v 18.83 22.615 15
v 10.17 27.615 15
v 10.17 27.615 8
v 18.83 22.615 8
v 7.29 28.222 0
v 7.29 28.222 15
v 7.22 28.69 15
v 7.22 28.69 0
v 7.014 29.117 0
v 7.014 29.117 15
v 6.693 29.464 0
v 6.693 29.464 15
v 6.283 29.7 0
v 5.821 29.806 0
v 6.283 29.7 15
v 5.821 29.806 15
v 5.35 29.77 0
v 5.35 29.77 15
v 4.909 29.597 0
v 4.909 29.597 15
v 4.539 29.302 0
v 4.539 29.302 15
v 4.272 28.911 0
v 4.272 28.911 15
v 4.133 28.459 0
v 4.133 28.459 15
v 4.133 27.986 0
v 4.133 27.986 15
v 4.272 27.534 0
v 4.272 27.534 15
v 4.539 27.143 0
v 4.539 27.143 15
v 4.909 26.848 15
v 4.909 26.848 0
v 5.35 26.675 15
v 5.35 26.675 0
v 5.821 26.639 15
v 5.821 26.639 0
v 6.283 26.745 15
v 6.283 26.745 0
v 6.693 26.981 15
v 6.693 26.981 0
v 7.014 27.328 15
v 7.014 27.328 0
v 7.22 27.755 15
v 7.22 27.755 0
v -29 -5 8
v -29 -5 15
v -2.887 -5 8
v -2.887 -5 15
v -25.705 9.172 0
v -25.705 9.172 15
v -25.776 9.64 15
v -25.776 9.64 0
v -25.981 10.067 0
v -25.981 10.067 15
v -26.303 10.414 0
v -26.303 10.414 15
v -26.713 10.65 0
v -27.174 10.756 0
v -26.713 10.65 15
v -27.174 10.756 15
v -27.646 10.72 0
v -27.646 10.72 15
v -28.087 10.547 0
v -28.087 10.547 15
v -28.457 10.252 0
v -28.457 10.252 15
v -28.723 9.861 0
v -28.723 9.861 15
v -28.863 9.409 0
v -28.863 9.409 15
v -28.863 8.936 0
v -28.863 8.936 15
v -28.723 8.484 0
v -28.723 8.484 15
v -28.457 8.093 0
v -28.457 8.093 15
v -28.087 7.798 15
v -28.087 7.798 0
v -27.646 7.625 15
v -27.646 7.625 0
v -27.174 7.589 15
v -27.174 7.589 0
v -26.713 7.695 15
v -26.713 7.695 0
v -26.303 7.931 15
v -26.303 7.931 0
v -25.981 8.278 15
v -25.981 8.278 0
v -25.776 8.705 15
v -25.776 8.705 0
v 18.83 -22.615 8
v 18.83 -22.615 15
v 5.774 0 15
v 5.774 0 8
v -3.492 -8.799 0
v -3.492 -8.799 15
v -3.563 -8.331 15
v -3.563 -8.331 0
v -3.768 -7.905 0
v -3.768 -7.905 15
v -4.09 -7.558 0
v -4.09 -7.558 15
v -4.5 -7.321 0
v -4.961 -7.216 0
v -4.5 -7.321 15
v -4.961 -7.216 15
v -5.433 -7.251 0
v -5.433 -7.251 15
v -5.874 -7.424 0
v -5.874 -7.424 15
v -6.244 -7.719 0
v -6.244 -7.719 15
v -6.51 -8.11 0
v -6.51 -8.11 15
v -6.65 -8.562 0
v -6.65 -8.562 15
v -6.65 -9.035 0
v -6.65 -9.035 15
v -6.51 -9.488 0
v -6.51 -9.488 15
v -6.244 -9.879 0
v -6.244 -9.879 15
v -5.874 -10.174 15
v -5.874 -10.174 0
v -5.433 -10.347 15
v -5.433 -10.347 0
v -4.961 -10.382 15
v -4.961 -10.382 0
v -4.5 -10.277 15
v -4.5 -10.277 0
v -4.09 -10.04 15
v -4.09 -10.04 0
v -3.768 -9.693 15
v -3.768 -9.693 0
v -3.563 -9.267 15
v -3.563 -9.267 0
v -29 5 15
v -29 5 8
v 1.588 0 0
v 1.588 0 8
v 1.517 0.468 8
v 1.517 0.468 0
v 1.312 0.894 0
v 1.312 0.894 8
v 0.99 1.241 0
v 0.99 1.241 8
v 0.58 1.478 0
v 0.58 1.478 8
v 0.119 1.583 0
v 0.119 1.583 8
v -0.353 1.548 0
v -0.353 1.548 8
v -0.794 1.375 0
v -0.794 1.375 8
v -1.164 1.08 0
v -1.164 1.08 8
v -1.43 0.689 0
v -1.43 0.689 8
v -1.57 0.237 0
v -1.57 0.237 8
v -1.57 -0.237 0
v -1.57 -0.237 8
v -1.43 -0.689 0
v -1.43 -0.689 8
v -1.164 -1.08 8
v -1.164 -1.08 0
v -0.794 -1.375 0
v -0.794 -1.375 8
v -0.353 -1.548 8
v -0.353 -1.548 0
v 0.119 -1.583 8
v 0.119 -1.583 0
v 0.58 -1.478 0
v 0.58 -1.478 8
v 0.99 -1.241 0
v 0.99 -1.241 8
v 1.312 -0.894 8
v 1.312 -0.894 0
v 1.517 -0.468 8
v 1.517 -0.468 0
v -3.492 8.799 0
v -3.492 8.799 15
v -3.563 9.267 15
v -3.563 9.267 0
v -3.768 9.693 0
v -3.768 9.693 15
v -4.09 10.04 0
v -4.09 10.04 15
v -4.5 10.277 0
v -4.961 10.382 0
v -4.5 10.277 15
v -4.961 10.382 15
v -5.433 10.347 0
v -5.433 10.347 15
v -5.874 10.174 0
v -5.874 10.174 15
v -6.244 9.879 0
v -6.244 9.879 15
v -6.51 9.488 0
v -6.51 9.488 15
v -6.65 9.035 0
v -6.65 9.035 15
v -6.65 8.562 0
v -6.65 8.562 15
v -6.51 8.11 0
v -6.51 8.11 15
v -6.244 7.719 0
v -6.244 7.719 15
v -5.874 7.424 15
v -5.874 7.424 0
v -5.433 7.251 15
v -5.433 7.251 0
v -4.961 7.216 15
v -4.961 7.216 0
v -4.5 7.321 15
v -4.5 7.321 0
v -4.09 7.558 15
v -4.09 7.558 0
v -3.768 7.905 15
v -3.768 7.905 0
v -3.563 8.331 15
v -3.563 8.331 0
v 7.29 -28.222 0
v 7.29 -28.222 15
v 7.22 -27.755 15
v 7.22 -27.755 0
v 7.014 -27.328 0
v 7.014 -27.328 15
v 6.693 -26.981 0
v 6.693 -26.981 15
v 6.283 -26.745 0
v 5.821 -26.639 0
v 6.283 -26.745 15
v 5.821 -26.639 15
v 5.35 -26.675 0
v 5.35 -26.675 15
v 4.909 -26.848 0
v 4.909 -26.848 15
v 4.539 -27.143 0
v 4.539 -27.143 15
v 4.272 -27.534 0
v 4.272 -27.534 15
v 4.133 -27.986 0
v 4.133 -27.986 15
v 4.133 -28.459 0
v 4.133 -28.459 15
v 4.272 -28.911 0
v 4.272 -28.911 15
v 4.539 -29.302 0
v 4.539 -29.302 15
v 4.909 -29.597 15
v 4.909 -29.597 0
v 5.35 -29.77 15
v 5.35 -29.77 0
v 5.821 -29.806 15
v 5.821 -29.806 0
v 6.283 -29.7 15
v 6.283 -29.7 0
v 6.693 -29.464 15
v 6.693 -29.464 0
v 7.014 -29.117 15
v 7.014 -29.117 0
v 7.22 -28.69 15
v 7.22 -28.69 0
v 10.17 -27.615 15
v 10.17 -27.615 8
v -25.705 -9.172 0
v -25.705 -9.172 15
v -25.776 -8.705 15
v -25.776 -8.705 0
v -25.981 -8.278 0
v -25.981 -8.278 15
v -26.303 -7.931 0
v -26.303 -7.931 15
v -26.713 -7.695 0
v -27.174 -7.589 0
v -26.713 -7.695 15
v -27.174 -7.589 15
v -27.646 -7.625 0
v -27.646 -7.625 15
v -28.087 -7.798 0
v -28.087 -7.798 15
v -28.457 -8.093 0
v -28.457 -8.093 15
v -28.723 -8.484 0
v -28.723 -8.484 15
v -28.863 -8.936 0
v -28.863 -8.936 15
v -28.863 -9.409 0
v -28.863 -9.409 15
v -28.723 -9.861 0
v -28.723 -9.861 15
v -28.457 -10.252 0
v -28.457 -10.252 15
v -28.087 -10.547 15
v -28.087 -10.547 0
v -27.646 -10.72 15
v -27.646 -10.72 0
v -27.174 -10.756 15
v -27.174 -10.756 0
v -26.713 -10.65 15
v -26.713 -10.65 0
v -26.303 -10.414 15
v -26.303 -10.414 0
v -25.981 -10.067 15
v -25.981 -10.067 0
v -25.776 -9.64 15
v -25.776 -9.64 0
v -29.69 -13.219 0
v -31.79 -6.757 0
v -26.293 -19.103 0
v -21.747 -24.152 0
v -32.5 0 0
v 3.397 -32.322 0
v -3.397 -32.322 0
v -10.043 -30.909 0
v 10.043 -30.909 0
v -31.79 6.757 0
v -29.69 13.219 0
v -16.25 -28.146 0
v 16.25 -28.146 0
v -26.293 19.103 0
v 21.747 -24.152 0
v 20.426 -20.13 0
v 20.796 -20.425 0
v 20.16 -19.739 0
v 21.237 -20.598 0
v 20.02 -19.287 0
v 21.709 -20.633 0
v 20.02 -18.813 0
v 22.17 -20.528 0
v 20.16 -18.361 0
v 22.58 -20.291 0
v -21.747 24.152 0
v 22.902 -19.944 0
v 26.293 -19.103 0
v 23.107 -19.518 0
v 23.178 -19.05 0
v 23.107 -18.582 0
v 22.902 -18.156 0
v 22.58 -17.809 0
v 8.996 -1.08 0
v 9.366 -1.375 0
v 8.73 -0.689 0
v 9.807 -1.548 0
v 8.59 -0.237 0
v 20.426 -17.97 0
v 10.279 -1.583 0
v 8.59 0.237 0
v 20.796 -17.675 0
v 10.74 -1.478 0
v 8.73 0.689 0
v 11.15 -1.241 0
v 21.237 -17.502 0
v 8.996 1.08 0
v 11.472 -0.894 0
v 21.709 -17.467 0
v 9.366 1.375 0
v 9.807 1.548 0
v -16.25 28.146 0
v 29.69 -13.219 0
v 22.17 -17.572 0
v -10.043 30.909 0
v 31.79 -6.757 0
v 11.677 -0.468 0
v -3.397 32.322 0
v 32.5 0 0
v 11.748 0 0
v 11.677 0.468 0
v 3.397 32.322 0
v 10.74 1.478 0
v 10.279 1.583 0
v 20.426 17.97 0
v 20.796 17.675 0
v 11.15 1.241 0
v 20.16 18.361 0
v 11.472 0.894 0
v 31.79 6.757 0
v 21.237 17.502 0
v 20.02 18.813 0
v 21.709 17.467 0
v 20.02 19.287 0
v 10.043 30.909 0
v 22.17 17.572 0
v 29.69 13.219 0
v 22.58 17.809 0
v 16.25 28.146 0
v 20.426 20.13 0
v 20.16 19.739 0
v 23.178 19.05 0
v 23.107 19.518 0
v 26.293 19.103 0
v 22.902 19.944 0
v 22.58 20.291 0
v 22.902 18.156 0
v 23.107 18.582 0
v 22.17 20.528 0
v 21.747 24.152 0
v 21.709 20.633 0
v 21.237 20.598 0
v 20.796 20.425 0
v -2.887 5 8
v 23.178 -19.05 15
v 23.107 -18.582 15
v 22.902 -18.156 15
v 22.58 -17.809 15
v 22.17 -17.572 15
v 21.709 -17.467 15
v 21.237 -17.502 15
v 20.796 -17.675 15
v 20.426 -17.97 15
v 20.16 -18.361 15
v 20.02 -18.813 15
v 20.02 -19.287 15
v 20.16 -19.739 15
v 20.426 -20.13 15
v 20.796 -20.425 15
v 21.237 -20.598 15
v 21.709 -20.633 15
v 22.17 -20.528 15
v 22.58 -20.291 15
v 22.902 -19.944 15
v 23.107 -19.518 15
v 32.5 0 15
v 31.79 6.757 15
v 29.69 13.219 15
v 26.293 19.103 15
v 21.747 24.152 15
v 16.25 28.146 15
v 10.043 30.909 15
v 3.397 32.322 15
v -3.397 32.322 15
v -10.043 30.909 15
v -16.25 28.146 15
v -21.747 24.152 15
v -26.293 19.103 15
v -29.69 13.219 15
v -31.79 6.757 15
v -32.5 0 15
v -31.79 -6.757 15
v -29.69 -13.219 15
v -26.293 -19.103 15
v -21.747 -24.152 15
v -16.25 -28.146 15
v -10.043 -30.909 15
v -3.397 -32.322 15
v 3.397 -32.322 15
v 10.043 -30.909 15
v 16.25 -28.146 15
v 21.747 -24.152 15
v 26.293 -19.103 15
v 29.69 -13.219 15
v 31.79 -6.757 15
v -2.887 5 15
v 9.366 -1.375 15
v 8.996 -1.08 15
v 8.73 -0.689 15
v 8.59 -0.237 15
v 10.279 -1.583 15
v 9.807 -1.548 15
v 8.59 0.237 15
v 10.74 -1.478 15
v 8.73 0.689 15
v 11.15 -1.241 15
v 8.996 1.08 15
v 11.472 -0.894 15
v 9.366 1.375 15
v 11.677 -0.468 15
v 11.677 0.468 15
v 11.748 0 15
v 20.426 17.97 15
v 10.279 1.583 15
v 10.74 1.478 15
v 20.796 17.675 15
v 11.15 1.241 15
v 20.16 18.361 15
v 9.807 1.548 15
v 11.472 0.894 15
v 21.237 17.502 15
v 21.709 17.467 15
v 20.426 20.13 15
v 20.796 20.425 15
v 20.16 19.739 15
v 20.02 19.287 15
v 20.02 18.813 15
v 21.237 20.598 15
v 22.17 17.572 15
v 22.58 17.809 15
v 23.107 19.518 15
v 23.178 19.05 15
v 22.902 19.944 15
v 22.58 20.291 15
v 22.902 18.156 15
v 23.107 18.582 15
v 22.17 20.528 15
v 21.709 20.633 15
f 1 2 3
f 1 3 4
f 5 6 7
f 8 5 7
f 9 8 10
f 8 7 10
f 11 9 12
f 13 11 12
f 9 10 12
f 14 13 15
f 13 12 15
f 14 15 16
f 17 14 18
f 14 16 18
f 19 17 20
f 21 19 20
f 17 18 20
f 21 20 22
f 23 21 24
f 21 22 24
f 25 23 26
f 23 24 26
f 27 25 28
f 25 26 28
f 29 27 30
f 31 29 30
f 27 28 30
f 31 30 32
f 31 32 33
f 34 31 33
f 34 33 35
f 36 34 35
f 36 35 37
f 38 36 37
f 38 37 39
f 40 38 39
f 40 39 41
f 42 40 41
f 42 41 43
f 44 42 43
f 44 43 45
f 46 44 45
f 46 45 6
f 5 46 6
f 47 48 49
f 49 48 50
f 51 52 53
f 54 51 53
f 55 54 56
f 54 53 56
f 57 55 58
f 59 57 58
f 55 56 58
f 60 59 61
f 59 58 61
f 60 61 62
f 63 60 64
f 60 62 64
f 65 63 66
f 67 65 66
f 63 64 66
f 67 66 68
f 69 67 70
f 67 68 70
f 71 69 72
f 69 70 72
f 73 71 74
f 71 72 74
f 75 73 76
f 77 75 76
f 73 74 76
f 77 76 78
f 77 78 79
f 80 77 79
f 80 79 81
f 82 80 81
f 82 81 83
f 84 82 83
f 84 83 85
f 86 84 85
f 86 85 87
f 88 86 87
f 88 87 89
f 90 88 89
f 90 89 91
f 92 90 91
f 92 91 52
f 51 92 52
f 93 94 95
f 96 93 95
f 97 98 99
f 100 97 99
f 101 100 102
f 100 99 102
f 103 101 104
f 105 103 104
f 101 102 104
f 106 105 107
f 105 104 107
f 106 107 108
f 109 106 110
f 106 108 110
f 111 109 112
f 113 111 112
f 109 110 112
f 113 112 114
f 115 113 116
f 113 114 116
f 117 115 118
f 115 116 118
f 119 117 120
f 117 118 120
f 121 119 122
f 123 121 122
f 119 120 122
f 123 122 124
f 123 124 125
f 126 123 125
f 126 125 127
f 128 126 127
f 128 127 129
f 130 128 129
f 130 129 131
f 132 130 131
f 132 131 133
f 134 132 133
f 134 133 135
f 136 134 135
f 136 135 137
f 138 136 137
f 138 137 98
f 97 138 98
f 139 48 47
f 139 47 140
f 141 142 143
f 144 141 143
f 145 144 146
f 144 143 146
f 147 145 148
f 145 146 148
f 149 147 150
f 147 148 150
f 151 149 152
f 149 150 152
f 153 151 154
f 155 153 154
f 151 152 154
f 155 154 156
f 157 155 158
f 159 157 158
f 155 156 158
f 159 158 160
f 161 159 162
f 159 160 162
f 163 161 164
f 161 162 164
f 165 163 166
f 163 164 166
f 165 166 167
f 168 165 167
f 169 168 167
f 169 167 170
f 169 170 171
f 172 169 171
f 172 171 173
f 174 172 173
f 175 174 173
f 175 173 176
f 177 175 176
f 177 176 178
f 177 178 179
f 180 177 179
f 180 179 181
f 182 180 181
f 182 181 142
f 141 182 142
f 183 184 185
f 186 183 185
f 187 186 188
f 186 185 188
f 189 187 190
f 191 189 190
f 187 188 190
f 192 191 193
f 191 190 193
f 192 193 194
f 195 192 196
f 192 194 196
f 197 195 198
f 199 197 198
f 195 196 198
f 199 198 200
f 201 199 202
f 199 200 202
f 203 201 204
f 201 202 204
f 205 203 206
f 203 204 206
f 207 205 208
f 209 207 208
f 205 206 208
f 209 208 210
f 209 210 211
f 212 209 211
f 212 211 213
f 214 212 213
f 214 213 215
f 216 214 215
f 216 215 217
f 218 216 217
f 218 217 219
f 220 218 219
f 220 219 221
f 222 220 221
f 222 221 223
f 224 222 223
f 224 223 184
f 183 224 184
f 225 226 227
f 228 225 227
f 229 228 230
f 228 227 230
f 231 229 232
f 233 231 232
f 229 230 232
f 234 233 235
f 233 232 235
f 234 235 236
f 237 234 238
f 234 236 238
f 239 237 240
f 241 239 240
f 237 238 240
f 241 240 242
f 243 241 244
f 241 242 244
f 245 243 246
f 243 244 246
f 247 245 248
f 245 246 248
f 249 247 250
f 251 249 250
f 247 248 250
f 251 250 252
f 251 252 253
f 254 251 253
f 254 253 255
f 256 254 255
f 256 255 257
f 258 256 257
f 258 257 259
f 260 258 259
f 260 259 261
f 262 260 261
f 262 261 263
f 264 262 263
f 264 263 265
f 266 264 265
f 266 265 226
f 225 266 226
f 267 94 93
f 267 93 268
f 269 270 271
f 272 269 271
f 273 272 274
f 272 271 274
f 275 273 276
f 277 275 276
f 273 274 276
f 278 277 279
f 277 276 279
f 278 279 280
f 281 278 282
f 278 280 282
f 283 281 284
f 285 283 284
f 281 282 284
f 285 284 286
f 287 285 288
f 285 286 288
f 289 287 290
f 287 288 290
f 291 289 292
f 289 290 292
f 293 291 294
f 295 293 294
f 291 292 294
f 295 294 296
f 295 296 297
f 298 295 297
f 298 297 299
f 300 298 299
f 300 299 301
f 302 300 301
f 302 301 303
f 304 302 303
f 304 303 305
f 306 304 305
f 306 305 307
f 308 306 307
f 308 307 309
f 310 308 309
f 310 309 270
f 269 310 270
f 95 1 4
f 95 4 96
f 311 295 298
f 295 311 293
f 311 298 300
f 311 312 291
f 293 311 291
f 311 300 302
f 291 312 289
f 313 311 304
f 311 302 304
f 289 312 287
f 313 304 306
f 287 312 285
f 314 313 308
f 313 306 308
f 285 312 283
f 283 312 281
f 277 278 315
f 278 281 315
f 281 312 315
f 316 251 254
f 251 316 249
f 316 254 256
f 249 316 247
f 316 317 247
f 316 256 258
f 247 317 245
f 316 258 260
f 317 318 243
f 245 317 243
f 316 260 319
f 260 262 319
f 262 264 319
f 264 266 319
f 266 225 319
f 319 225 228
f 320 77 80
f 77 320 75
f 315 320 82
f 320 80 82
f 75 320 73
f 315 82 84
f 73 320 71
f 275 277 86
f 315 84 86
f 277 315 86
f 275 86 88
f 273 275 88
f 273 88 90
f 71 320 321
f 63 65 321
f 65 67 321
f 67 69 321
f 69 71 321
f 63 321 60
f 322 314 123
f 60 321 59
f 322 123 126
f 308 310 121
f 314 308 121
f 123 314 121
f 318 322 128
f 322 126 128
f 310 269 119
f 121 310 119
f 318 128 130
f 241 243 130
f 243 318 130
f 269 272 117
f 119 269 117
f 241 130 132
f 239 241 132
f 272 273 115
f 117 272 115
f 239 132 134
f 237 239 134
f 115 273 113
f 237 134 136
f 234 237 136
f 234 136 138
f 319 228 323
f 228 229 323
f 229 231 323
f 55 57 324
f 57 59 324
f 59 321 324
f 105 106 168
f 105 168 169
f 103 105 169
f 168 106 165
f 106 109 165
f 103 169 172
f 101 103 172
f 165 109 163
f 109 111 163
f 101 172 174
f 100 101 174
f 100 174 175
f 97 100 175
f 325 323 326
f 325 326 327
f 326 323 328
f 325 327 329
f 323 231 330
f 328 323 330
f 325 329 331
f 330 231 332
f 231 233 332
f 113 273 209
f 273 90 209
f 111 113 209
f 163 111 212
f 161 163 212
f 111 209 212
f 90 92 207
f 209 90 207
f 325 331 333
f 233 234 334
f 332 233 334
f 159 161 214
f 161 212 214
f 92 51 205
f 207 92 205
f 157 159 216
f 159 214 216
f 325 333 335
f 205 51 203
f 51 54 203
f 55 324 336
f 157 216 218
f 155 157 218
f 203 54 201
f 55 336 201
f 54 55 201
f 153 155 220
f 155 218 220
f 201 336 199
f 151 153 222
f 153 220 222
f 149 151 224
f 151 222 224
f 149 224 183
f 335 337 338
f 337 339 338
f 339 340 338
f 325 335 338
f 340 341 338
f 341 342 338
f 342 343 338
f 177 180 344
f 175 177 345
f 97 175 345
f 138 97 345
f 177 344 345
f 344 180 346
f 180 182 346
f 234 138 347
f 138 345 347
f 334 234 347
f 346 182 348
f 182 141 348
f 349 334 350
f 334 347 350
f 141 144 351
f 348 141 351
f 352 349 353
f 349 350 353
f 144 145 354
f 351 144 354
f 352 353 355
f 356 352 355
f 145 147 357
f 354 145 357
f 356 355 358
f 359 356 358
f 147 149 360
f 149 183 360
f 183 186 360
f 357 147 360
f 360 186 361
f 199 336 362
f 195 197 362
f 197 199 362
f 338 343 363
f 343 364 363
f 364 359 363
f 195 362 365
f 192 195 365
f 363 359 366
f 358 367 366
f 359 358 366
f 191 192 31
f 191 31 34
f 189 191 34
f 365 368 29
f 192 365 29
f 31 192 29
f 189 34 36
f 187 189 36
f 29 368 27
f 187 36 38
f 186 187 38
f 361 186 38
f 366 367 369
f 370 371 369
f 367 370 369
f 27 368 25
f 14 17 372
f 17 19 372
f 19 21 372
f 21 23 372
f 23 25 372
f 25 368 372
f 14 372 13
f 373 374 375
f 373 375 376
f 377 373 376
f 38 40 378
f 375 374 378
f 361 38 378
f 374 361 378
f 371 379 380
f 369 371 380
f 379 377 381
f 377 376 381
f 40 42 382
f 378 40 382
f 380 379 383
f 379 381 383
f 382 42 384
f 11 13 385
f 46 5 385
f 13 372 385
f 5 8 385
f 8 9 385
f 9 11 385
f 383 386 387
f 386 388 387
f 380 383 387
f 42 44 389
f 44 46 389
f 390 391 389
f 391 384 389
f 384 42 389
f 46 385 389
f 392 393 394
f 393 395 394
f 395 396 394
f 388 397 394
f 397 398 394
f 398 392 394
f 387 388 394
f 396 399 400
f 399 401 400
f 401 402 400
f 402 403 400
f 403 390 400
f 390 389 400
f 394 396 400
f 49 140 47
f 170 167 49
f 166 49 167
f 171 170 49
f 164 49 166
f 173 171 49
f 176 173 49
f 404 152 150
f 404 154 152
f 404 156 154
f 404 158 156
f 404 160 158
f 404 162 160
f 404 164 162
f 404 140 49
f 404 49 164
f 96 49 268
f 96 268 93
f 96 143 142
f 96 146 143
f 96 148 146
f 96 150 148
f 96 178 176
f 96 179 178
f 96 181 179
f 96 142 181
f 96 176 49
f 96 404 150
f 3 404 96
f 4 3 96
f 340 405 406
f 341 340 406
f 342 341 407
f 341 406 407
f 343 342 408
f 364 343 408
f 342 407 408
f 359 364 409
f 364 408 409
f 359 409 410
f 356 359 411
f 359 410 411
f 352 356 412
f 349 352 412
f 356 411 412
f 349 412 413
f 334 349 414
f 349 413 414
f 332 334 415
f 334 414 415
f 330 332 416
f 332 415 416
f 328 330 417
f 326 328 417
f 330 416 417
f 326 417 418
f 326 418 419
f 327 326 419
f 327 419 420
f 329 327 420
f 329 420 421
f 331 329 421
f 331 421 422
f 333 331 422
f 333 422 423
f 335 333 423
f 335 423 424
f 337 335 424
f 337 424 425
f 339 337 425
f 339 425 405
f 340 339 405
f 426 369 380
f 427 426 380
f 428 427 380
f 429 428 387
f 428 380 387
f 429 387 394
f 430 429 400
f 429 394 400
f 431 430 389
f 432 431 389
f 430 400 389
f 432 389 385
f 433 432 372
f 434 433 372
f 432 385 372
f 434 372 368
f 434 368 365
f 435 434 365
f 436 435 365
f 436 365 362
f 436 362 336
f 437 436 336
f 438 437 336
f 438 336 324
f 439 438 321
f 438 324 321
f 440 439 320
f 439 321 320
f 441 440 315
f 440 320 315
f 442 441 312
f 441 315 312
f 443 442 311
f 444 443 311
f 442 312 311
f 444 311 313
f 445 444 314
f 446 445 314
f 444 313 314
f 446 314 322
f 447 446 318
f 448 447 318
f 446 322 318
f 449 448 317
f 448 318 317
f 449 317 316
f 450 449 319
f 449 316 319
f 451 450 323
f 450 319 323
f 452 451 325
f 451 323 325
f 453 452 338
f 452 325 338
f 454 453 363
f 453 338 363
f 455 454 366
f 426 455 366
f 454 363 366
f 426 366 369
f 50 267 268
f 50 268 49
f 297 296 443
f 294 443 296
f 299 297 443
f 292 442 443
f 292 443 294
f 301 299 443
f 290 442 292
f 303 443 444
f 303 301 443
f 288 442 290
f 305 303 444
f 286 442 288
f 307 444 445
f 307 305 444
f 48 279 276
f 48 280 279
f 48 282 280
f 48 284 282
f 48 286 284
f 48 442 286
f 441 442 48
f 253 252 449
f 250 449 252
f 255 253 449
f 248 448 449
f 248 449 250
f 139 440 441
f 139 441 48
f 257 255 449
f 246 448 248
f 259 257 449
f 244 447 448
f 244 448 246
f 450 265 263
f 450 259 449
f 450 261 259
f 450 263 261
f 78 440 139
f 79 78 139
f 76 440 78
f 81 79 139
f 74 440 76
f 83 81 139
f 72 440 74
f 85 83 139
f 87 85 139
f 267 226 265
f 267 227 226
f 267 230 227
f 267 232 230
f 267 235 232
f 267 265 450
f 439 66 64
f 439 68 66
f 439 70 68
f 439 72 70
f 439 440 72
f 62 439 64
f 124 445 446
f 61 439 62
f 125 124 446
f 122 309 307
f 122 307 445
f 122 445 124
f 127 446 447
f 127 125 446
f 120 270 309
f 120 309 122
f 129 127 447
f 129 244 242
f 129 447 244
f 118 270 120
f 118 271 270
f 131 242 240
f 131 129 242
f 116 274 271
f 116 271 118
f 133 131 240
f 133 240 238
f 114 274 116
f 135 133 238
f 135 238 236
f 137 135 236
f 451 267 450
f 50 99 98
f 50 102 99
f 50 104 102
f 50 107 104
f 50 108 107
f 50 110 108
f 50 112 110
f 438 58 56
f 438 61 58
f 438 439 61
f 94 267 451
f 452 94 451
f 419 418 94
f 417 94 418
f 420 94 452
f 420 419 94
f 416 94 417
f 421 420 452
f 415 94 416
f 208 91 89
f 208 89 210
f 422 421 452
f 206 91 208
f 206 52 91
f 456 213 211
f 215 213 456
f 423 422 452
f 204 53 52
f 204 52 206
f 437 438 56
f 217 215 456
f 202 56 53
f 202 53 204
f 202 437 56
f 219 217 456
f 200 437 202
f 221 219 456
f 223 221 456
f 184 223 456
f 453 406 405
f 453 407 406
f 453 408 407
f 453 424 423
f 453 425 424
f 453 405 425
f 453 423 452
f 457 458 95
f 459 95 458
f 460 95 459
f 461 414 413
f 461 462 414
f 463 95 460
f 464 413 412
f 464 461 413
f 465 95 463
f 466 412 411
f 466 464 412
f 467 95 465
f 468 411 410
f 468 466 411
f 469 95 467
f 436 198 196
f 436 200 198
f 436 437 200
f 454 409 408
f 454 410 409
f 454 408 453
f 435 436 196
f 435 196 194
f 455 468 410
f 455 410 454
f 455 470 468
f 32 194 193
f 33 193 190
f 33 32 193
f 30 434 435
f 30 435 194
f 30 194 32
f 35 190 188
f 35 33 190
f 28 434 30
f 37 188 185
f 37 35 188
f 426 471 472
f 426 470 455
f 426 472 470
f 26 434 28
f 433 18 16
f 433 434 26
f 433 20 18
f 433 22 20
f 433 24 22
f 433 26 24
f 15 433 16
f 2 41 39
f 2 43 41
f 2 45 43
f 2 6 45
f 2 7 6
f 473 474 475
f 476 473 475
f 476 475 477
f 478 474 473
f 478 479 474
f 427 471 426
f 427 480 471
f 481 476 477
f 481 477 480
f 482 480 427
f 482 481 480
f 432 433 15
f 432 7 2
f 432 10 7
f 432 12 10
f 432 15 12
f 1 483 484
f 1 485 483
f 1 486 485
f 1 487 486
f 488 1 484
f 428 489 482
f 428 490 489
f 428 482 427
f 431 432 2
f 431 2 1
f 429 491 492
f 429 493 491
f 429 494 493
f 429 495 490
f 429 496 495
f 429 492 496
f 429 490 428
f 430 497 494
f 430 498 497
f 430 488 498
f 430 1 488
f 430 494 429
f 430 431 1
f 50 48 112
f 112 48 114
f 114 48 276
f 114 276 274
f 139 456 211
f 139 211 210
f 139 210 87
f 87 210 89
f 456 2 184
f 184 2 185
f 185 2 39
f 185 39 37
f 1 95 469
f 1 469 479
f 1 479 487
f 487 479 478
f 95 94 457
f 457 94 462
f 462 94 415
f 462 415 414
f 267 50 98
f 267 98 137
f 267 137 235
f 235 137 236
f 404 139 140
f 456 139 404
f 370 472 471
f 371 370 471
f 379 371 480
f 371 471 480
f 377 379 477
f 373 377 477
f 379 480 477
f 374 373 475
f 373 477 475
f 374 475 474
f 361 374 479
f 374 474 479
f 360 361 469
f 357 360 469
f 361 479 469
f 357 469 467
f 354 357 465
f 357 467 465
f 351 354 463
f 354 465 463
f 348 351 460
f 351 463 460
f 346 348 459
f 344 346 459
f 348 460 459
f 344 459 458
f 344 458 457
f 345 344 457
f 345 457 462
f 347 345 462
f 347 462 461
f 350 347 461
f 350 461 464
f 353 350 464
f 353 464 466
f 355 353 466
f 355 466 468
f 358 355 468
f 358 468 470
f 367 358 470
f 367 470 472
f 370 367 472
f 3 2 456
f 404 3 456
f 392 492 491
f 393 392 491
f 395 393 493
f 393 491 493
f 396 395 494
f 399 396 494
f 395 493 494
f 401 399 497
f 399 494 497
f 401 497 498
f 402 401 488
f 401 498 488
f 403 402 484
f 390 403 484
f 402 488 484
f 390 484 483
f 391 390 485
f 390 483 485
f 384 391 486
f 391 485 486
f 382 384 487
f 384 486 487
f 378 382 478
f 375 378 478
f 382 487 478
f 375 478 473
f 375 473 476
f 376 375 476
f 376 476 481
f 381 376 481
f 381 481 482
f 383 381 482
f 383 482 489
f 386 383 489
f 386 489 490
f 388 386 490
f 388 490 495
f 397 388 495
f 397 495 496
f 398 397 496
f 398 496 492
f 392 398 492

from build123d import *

# Parameters (mm, degrees)
F0_R            = 32.5
F1_DEPTH        = 15
F2_W            = 29
F2_H            = 10
F3_DEPTH        = 7
F3_COPIES_COUNT = 3
F4_R            = 1.5875
F5_DEPTH        = 25.4
F6_R            = 1.5875
F7_DEPTH        = 25.4


# Not quite as in the source:
# - a pattern or mirror of a feature is missing from the dataset's text; its kind, count and spacing are read off the source's solid


with BuildPart() as f1:
    # F0 (on Top) → F1 (new body)
    with BuildSketch(Plane.XY):
        Circle(F0_R)
    extrude(amount=F1_DEPTH)

    # F2 (on face) → F3 (cut)
    with BuildSketch(Plane.XY.offset(15)):
        with Locations((-14.5, 0)):
            Rectangle(F2_W, F2_H)
    f3 = extrude(amount=-F3_DEPTH, mode=Mode.SUBTRACT)

    # F3_copies: F3 ×3 about axis
    f3_copies_axis = Axis((0, 0, 0), (0, 0, 1))
    for i in range(1, F3_COPIES_COUNT):
        add(f3.rotate(f3_copies_axis, i * 360 / F3_COPIES_COUNT), mode=Mode.SUBTRACT)

    # F4 (on face) → F5 (cut)
    with BuildSketch(Plane.XY.offset(8)):
        Circle(F4_R)
    extrude(amount=-F5_DEPTH, mode=Mode.SUBTRACT)

    # F6 (on face) → F7 (cut)
    with BuildSketch(Plane.XY.offset(15)):
        with Locations((10.16, 0)):
            Circle(F6_R)
        with Locations((21.59, 19.05)):
            Circle(F6_R)
        with Locations((21.59, -19.05)):
            Circle(F6_R)
        with Locations((-5.08, 8.7988181024)):
            Circle(F6_R)
        with Locations((5.7027839421, 28.2224884677)):
            Circle(F6_R)
        with Locations((-27.2927839421, 9.1724884677)):
            Circle(F6_R)
        with Locations((-27.2927839421, -9.1724884677)):
            Circle(F6_R)
        with Locations((-5.08, -8.7988181024)):
            Circle(F6_R)
        with Locations((5.7027839421, -28.2224884677)):
            Circle(F6_R)
    extrude(amount=-F7_DEPTH, mode=Mode.SUBTRACT)


solid = f1.part
